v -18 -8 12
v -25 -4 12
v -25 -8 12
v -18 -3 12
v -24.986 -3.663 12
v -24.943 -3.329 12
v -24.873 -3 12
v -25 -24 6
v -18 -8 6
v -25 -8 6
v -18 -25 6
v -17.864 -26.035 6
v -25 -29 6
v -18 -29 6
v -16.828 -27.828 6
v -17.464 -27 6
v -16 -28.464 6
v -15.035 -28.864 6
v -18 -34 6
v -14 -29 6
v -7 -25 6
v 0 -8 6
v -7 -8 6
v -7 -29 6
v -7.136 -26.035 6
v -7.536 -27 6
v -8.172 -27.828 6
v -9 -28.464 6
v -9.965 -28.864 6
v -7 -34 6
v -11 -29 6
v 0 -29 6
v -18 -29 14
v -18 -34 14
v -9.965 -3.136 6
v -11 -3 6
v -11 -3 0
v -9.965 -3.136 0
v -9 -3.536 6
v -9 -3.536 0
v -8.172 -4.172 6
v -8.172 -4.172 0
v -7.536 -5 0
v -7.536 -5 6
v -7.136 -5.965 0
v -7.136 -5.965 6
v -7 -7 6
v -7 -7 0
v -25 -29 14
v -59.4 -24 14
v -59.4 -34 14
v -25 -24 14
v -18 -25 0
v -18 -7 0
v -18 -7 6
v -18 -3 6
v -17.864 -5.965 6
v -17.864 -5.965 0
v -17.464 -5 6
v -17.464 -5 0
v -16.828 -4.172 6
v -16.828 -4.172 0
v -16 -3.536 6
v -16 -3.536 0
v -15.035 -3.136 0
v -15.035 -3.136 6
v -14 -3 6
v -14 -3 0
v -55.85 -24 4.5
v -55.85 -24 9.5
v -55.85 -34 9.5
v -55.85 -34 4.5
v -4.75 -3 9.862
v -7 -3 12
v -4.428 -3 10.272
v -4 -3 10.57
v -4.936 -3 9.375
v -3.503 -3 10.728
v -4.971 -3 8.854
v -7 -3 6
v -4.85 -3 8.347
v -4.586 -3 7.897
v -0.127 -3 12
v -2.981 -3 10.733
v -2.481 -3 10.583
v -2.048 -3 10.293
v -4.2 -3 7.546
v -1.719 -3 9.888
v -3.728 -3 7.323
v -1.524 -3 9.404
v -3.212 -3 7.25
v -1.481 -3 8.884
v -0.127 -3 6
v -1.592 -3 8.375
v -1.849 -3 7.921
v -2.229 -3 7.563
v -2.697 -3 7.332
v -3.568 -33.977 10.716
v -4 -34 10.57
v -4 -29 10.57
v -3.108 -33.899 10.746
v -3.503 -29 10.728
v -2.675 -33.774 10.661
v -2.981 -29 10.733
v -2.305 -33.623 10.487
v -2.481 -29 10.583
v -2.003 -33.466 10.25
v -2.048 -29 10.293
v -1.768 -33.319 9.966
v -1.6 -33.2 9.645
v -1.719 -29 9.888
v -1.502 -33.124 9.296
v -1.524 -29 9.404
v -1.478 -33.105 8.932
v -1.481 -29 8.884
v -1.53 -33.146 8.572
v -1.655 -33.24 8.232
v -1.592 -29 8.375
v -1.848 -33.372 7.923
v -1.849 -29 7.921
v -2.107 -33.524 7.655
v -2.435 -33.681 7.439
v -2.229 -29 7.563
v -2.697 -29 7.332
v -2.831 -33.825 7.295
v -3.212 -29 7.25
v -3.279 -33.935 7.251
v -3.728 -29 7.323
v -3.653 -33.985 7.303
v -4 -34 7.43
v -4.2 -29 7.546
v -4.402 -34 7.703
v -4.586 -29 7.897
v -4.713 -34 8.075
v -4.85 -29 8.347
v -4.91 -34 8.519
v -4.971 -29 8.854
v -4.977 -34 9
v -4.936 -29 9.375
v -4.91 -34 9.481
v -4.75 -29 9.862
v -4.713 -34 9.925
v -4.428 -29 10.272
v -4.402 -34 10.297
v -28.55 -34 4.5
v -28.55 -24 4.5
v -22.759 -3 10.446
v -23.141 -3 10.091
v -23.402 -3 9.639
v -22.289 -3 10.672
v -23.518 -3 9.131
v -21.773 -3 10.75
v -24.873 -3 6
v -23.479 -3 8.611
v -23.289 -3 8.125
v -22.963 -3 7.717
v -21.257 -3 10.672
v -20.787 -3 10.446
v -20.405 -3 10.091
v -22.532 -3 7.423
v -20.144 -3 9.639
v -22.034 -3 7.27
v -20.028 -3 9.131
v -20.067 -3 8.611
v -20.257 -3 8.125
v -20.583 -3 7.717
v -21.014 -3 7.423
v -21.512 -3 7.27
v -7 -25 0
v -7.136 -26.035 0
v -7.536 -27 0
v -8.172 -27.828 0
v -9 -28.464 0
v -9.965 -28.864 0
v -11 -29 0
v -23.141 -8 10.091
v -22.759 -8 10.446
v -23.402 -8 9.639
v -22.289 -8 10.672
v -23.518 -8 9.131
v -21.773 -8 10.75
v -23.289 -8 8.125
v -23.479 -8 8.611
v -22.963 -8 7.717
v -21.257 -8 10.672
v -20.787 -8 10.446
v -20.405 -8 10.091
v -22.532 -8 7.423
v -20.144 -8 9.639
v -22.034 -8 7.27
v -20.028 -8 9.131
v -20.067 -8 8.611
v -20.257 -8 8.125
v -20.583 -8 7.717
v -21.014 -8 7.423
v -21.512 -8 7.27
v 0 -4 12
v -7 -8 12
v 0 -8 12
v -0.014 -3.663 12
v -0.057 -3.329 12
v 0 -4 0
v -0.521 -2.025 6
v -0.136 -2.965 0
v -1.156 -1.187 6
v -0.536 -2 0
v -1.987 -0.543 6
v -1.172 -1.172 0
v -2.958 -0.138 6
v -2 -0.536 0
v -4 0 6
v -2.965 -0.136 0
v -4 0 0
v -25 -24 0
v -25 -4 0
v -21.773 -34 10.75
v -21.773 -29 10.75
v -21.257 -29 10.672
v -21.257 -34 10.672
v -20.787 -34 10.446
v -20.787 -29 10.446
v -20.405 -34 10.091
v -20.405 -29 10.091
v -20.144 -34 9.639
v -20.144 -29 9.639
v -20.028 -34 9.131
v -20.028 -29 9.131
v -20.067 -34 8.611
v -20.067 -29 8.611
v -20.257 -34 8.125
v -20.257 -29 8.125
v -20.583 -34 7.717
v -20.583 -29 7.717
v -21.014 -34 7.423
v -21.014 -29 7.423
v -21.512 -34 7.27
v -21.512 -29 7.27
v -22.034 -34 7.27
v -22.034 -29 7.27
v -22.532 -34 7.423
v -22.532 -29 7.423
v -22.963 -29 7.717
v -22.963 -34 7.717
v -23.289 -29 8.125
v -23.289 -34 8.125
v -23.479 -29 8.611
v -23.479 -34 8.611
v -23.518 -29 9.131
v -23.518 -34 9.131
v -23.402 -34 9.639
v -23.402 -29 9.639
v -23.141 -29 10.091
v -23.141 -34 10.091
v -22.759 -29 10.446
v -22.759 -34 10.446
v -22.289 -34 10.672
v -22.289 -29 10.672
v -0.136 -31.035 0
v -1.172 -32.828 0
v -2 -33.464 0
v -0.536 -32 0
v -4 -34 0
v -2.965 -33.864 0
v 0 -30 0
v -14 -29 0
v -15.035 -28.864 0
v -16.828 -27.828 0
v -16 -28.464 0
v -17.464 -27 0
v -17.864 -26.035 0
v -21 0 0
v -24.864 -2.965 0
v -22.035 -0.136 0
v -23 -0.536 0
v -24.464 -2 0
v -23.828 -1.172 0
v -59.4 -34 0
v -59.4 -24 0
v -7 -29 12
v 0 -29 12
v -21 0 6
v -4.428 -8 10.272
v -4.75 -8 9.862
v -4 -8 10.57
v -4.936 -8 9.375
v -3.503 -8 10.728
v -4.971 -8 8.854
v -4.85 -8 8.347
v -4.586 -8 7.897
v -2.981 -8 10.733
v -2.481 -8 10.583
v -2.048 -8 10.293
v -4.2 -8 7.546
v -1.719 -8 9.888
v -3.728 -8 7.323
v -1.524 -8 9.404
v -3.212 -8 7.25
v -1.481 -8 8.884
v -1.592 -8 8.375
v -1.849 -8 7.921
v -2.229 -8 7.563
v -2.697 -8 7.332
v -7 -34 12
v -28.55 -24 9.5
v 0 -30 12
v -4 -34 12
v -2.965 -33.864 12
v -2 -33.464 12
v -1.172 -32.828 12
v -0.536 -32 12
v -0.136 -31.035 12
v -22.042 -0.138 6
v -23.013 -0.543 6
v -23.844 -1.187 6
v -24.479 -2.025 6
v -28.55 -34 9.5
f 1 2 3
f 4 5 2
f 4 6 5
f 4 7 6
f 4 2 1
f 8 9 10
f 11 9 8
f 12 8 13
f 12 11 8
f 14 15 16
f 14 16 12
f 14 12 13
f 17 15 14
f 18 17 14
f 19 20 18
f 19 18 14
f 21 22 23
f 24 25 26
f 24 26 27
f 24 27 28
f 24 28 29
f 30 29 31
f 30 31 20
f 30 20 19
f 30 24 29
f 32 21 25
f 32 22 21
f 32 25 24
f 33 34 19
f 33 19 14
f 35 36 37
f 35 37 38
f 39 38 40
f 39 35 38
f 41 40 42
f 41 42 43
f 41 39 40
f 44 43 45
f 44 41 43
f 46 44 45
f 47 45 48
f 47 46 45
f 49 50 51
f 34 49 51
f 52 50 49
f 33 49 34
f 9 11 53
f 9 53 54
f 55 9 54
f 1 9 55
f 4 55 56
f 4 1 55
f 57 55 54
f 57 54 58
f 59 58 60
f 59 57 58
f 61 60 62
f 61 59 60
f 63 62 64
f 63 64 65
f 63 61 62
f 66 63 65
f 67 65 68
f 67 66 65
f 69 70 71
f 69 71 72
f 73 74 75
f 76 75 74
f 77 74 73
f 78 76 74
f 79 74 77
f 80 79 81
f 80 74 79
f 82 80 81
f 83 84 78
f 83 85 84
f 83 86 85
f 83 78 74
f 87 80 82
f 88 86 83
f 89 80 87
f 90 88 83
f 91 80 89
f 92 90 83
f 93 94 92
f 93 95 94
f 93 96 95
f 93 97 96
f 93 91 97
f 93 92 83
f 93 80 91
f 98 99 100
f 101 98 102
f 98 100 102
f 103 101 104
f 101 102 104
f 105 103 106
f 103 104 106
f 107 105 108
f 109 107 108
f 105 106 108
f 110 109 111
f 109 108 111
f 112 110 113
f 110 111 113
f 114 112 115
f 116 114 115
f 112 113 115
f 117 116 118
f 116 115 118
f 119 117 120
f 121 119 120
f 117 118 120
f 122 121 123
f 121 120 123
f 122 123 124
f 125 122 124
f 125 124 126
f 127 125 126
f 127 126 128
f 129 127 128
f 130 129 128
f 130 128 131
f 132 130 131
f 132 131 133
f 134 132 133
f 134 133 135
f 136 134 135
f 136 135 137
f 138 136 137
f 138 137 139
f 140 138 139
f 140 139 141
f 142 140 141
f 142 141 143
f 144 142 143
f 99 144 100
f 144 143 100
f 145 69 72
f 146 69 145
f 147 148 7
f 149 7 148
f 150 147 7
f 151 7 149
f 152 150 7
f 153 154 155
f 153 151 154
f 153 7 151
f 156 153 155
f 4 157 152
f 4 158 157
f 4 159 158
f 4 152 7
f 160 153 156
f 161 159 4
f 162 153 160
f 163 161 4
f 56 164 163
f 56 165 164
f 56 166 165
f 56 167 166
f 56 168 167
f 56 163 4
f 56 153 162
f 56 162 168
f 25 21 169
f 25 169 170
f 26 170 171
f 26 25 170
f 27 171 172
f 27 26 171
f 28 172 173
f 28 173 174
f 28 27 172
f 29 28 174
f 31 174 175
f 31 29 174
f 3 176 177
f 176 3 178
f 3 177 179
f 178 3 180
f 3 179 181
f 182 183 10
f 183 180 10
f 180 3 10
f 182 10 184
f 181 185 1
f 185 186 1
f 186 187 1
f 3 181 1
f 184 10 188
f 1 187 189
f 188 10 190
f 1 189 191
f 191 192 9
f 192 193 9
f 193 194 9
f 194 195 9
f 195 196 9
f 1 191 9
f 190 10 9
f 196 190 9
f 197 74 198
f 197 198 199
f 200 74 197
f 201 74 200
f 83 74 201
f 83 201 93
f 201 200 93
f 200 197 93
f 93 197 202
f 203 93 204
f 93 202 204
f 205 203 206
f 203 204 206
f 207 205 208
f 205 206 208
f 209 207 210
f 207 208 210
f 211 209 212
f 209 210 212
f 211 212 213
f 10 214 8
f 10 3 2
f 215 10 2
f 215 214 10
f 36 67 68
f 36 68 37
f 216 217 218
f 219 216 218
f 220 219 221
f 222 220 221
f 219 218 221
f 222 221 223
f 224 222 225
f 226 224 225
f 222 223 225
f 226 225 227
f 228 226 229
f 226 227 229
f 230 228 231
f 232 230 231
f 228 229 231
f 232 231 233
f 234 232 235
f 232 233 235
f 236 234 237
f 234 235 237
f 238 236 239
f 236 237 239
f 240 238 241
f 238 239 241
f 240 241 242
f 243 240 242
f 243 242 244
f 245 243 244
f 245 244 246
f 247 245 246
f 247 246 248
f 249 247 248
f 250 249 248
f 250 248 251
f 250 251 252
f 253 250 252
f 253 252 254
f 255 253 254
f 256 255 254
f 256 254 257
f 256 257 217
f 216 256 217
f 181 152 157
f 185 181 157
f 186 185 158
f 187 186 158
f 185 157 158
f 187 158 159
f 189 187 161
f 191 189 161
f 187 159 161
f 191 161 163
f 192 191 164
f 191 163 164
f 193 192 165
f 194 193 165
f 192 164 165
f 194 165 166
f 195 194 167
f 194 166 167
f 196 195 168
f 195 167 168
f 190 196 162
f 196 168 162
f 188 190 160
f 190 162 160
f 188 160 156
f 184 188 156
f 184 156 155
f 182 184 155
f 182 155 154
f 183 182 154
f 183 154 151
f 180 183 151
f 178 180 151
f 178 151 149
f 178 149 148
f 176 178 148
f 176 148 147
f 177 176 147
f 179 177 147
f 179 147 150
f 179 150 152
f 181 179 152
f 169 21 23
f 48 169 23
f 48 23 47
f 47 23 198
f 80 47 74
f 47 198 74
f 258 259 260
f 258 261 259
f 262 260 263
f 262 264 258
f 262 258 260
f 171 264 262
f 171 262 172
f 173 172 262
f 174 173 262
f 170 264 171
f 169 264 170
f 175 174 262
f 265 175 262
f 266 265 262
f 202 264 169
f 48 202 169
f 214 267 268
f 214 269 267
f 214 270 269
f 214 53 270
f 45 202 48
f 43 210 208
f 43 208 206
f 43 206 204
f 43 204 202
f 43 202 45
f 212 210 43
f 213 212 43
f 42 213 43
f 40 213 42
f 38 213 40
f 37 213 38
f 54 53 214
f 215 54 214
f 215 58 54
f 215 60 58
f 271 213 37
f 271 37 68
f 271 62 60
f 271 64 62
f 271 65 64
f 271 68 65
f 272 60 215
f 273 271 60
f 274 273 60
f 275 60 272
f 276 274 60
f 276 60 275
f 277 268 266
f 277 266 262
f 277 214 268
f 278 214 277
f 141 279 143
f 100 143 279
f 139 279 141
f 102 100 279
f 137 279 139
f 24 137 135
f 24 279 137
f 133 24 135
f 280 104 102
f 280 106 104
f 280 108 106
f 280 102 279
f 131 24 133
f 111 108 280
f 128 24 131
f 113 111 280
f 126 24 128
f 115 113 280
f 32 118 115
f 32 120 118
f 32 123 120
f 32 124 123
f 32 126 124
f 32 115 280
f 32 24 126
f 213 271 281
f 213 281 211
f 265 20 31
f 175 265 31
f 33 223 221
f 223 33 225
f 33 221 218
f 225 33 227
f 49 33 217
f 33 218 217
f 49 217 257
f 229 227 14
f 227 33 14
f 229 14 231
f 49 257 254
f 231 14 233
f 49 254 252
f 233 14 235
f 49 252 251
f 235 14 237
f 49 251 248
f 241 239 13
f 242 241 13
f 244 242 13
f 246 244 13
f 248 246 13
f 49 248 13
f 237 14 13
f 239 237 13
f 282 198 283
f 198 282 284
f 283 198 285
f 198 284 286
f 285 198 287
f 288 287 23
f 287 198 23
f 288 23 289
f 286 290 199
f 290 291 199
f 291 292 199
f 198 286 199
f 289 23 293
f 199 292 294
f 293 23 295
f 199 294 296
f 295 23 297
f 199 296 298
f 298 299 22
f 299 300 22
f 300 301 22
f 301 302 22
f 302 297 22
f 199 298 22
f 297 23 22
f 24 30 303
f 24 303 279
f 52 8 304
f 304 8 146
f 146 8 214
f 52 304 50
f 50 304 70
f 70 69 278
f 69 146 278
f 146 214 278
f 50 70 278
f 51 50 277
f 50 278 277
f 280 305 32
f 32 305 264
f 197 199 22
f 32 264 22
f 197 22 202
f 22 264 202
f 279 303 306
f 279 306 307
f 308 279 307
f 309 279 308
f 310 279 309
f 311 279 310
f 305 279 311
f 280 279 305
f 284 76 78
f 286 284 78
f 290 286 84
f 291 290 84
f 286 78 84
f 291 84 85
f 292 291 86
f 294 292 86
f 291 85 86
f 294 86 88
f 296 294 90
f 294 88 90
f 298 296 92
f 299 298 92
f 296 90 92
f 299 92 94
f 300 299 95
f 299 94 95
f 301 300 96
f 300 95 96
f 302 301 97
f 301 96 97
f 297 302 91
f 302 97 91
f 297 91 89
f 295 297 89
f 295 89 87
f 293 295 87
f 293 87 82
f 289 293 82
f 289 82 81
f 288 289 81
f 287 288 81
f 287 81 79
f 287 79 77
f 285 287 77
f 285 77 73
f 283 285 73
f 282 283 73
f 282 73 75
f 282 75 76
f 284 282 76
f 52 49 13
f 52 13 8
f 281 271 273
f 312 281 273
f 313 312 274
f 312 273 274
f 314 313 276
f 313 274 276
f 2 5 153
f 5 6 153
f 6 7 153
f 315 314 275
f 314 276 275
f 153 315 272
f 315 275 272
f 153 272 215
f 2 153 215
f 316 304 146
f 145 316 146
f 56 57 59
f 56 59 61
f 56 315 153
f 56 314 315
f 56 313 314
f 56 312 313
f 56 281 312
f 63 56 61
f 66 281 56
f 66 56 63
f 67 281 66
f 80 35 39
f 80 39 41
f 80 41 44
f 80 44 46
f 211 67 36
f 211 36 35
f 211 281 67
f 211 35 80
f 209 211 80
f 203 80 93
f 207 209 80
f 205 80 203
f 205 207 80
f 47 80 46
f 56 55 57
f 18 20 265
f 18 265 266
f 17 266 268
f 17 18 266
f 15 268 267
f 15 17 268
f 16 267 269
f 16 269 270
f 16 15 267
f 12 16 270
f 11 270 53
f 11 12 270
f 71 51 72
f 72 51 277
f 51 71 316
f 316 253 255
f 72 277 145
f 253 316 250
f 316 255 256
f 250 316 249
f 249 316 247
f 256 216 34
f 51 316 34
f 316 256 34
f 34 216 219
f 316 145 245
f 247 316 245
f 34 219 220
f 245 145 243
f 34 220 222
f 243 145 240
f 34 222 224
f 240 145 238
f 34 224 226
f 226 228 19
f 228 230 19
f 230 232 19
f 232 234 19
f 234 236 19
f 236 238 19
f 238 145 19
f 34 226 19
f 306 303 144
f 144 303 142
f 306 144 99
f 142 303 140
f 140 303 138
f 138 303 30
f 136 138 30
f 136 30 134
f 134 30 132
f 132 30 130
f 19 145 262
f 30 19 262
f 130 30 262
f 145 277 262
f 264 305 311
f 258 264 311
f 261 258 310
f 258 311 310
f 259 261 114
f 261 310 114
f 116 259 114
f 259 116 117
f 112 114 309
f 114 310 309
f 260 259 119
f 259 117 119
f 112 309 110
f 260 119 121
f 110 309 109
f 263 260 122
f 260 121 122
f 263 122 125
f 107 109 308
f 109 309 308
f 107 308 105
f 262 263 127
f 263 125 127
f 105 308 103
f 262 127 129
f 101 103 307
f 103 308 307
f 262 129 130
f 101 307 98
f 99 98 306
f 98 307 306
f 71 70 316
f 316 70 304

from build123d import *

# Parameters (mm, degrees)
CROQUIS1_W              = 25
CROQUIS1_H              = 34
SALIENTE_EXTRUIR1_DEPTH = 6
CROQUIS2_W              = 7
CROQUIS2_H              = 5
SALIENTE_EXTRUIR2_DEPTH = 6
CORTAR_EXTRUIR1_REACH   = 44.626
CROQUIS3_W              = 11
CROQUIS3_H              = 26
REDONDEO1_R             = 4
SALIENTE_EXTRUIR3_DEPTH = 12
SALIENTE_EXTRUIR4_DEPTH = 2
CORTAR_EXTRUIR2_REACH   = 70.45
CROQUIS7_R              = 1.75
CORTAR_EXTRUIR3_REACH   = 67.577
CROQUIS8_W              = 27.3
CROQUIS8_H              = 5


with BuildPart() as part:
    # Croquis1 → Saliente-Extruir1 (new body)
    with BuildSketch(Plane.XY):
        with Locations((-12.5, -17)):
            Rectangle(CROQUIS1_W, CROQUIS1_H)
    extrude(amount=SALIENTE_EXTRUIR1_DEPTH)

    # Croquis2 → Saliente-Extruir2 (add)
    with BuildSketch(Plane.XY.offset(6)):
        with Locations((-21.5, -5.5)):
            Rectangle(CROQUIS2_W, CROQUIS2_H)
        with Locations((-3.5, -5.5)):
            Rectangle(CROQUIS2_W, CROQUIS2_H)
        with Locations((-3.5, -31.5)):
            Rectangle(CROQUIS2_W, CROQUIS2_H)
        with Locations((-21.5, -31.5)):
            Rectangle(CROQUIS2_W, CROQUIS2_H)
    extrude(amount=SALIENTE_EXTRUIR2_DEPTH)

    # Croquis3 → Cortar-Extruir1 (cut, up to next)
    with BuildSketch(Plane.XY.offset(6), mode=Mode.PRIVATE) as cortar_extruir1_sk1:
        with Locations((-12.5, -16)):
            Rectangle(CROQUIS3_W, CROQUIS3_H)
    cortar_extruir1_tool1 = extrude(cortar_extruir1_sk1.sketch, amount=-CORTAR_EXTRUIR1_REACH, mode=Mode.PRIVATE) & part.part
    add(cortar_extruir1_tool1.solids().sort_by_distance((-12.5, -16, 6))[0], mode=Mode.SUBTRACT)

    # Redondeo1
    # the kernel refuses this fillet: 4 mm, written as the material it adds along each edge
    with BuildSketch(Plane(origin=(-18, -29, 6), x_dir=(0, 1, 0), z_dir=(0, 0, -1)), Plane(origin=(-7, -29, 6), x_dir=(-1, 0, 0), z_dir=(0, 0, -1)), Plane(origin=(-18, -3, 6), x_dir=(1, 0, 0), z_dir=(0, 0, -1))) as redondeo1_piece_1:
        with BuildLine():
            CenterArc((REDONDEO1_R, REDONDEO1_R), REDONDEO1_R, 180, 90)
            Line((0, REDONDEO1_R), (0, 0))
            Line((0, 0), (REDONDEO1_R, 0))
        make_face()
    extrude(amount=6)
    with BuildSketch(Plane(origin=(-7, -3, 6), x_dir=(-1, 0, 0), z_dir=(0, 0, -1))) as redondeo1_piece_2:
        with BuildLine():
            CenterArc((REDONDEO1_R, -REDONDEO1_R), REDONDEO1_R, 90, 90)
            Line((0, -REDONDEO1_R), (0, 0))
            Line((0, 0), (REDONDEO1_R, 0))
        make_face()
    extrude(amount=6)
    # the kernel refuses this fillet: 4 mm, written as the material it takes off along each edge
    with BuildSketch(Plane(origin=(0, 0, -10), x_dir=(-1, 0, 0), z_dir=(0, 0, 1))) as redondeo1_2_piece_1:
        with BuildLine():
            CenterArc((REDONDEO1_R, REDONDEO1_R), REDONDEO1_R, 180, 90)
            Line((0, REDONDEO1_R), (0, 0))
            Line((0, 0), (REDONDEO1_R, 0))
        make_face()
    extrude(amount=26, mode=Mode.SUBTRACT)
    with BuildSketch(Plane(origin=(0, -34, 22), x_dir=(0, 1, 0), z_dir=(0, 0, -1)), Plane(origin=(-25, -34, -10), x_dir=(0, 1, 0), z_dir=(0, 0, 1))) as redondeo1_2_piece_2:
        with BuildLine():
            CenterArc((REDONDEO1_R, -REDONDEO1_R), REDONDEO1_R, 90, 90)
            Line((0, -REDONDEO1_R), (0, 0))
            Line((0, 0), (REDONDEO1_R, 0))
        make_face()
    extrude(amount=32, mode=Mode.SUBTRACT)
    with BuildSketch(Plane(origin=(-25, 0, -10), x_dir=(1, 0, 0), z_dir=(0, 0, 1))) as redondeo1_2_piece_3:
        with BuildLine():
            CenterArc((REDONDEO1_R, -REDONDEO1_R), REDONDEO1_R, 90, 90)
            Line((0, -REDONDEO1_R), (0, 0))
            Line((0, 0), (REDONDEO1_R, 0))
        make_face()
    extrude(amount=26, mode=Mode.SUBTRACT)

    # Croquis5 → Saliente-Extruir3 (add)
    with BuildSketch(Plane(origin=(0, 0, 0), x_dir=(-1, 0, 0), z_dir=(0, 0, -1))):
        with BuildLine():
            Line((25, -29), (25, -30))
            ThreePointArc((25, -30), (23.828427125, -32.828427125), (21, -34))
            Line((21, -34), (25, -34))
            Line((25, -34), (59.4, -34))
            Line((59.4, -34), (59.4, -24))
            Line((59.4, -24), (25, -24))
            Line((25, -24), (25, -29))
        make_face()
    extrude(amount=-SALIENTE_EXTRUIR3_DEPTH)

    # Croquis6 → Saliente-Extruir4 (add)
    with BuildSketch(Plane.XY.offset(12)):
        Polygon((-18, -29), (-25, -29), (-25, -24), (-59.4, -24), (-59.4, -34), (-18, -34), align=None)
    extrude(amount=SALIENTE_EXTRUIR4_DEPTH)

    # Cortar-Extruir2: up to this face of the body (flat: up to its plane)
    cortar_extruir2_end = Plane(part.part.faces().sort_by_distance((-34.409507042, -34, 6.559859155))[0])
    # Croquis7 → Cortar-Extruir2 (cut, up to the picked face)
    with BuildSketch(Plane(origin=(0, -3, 0), x_dir=(1, 0, 0), z_dir=(0, 1, 0)), mode=Mode.PRIVATE) as cortar_extruir2_sk1:
        with Locations(Location((-21.772983346, -9, 0), (0, 0, 270))):
            Circle(CROQUIS7_R)
    cortar_extruir2_tool1 = split(extrude(cortar_extruir2_sk1.sketch, amount=-CORTAR_EXTRUIR2_REACH, mode=Mode.PRIVATE), bisect_by=cortar_extruir2_end, keep=Keep.BOTH, mode=Mode.PRIVATE)
    # Croquis7 → Cortar-Extruir2 (cut, up to the picked face)
    with BuildSketch(Plane(origin=(0, -3, 0), x_dir=(1, 0, 0), z_dir=(0, 1, 0)), mode=Mode.PRIVATE) as cortar_extruir2_sk2:
        with Locations(Location((-3.227016654, -9, 0), (0, 0, 243.787297197))):
            Circle(CROQUIS7_R)
    cortar_extruir2_tool2 = split(extrude(cortar_extruir2_sk2.sketch, amount=-CORTAR_EXTRUIR2_REACH, mode=Mode.PRIVATE), bisect_by=cortar_extruir2_end, keep=Keep.BOTH, mode=Mode.PRIVATE)
    add(cortar_extruir2_tool1.solids().sort_by(Axis((-21.772983, -3, 9), (0, -1, 0)))[0], mode=Mode.SUBTRACT)
    add(cortar_extruir2_tool2.solids().sort_by(Axis((-3.227017, -3, 9), (0, -1, 0)))[0], mode=Mode.SUBTRACT)

    # Croquis8 → Cortar-Extruir3 (cut, up to next)
    with BuildSketch(Plane(origin=(0, -24, 0), x_dir=(1, 0, 0), z_dir=(0, 1, 0)), mode=Mode.PRIVATE) as cortar_extruir3_sk1:
        with Locations((-42.2, -7)):
            Rectangle(CROQUIS8_W, CROQUIS8_H)
    cortar_extruir3_tool1 = extrude(cortar_extruir3_sk1.sketch, amount=-CORTAR_EXTRUIR3_REACH, mode=Mode.PRIVATE) & part.part
    add(cortar_extruir3_tool1.solids().sort_by_distance((-42.2, -24, 7))[0], mode=Mode.SUBTRACT)


solid = part.part
